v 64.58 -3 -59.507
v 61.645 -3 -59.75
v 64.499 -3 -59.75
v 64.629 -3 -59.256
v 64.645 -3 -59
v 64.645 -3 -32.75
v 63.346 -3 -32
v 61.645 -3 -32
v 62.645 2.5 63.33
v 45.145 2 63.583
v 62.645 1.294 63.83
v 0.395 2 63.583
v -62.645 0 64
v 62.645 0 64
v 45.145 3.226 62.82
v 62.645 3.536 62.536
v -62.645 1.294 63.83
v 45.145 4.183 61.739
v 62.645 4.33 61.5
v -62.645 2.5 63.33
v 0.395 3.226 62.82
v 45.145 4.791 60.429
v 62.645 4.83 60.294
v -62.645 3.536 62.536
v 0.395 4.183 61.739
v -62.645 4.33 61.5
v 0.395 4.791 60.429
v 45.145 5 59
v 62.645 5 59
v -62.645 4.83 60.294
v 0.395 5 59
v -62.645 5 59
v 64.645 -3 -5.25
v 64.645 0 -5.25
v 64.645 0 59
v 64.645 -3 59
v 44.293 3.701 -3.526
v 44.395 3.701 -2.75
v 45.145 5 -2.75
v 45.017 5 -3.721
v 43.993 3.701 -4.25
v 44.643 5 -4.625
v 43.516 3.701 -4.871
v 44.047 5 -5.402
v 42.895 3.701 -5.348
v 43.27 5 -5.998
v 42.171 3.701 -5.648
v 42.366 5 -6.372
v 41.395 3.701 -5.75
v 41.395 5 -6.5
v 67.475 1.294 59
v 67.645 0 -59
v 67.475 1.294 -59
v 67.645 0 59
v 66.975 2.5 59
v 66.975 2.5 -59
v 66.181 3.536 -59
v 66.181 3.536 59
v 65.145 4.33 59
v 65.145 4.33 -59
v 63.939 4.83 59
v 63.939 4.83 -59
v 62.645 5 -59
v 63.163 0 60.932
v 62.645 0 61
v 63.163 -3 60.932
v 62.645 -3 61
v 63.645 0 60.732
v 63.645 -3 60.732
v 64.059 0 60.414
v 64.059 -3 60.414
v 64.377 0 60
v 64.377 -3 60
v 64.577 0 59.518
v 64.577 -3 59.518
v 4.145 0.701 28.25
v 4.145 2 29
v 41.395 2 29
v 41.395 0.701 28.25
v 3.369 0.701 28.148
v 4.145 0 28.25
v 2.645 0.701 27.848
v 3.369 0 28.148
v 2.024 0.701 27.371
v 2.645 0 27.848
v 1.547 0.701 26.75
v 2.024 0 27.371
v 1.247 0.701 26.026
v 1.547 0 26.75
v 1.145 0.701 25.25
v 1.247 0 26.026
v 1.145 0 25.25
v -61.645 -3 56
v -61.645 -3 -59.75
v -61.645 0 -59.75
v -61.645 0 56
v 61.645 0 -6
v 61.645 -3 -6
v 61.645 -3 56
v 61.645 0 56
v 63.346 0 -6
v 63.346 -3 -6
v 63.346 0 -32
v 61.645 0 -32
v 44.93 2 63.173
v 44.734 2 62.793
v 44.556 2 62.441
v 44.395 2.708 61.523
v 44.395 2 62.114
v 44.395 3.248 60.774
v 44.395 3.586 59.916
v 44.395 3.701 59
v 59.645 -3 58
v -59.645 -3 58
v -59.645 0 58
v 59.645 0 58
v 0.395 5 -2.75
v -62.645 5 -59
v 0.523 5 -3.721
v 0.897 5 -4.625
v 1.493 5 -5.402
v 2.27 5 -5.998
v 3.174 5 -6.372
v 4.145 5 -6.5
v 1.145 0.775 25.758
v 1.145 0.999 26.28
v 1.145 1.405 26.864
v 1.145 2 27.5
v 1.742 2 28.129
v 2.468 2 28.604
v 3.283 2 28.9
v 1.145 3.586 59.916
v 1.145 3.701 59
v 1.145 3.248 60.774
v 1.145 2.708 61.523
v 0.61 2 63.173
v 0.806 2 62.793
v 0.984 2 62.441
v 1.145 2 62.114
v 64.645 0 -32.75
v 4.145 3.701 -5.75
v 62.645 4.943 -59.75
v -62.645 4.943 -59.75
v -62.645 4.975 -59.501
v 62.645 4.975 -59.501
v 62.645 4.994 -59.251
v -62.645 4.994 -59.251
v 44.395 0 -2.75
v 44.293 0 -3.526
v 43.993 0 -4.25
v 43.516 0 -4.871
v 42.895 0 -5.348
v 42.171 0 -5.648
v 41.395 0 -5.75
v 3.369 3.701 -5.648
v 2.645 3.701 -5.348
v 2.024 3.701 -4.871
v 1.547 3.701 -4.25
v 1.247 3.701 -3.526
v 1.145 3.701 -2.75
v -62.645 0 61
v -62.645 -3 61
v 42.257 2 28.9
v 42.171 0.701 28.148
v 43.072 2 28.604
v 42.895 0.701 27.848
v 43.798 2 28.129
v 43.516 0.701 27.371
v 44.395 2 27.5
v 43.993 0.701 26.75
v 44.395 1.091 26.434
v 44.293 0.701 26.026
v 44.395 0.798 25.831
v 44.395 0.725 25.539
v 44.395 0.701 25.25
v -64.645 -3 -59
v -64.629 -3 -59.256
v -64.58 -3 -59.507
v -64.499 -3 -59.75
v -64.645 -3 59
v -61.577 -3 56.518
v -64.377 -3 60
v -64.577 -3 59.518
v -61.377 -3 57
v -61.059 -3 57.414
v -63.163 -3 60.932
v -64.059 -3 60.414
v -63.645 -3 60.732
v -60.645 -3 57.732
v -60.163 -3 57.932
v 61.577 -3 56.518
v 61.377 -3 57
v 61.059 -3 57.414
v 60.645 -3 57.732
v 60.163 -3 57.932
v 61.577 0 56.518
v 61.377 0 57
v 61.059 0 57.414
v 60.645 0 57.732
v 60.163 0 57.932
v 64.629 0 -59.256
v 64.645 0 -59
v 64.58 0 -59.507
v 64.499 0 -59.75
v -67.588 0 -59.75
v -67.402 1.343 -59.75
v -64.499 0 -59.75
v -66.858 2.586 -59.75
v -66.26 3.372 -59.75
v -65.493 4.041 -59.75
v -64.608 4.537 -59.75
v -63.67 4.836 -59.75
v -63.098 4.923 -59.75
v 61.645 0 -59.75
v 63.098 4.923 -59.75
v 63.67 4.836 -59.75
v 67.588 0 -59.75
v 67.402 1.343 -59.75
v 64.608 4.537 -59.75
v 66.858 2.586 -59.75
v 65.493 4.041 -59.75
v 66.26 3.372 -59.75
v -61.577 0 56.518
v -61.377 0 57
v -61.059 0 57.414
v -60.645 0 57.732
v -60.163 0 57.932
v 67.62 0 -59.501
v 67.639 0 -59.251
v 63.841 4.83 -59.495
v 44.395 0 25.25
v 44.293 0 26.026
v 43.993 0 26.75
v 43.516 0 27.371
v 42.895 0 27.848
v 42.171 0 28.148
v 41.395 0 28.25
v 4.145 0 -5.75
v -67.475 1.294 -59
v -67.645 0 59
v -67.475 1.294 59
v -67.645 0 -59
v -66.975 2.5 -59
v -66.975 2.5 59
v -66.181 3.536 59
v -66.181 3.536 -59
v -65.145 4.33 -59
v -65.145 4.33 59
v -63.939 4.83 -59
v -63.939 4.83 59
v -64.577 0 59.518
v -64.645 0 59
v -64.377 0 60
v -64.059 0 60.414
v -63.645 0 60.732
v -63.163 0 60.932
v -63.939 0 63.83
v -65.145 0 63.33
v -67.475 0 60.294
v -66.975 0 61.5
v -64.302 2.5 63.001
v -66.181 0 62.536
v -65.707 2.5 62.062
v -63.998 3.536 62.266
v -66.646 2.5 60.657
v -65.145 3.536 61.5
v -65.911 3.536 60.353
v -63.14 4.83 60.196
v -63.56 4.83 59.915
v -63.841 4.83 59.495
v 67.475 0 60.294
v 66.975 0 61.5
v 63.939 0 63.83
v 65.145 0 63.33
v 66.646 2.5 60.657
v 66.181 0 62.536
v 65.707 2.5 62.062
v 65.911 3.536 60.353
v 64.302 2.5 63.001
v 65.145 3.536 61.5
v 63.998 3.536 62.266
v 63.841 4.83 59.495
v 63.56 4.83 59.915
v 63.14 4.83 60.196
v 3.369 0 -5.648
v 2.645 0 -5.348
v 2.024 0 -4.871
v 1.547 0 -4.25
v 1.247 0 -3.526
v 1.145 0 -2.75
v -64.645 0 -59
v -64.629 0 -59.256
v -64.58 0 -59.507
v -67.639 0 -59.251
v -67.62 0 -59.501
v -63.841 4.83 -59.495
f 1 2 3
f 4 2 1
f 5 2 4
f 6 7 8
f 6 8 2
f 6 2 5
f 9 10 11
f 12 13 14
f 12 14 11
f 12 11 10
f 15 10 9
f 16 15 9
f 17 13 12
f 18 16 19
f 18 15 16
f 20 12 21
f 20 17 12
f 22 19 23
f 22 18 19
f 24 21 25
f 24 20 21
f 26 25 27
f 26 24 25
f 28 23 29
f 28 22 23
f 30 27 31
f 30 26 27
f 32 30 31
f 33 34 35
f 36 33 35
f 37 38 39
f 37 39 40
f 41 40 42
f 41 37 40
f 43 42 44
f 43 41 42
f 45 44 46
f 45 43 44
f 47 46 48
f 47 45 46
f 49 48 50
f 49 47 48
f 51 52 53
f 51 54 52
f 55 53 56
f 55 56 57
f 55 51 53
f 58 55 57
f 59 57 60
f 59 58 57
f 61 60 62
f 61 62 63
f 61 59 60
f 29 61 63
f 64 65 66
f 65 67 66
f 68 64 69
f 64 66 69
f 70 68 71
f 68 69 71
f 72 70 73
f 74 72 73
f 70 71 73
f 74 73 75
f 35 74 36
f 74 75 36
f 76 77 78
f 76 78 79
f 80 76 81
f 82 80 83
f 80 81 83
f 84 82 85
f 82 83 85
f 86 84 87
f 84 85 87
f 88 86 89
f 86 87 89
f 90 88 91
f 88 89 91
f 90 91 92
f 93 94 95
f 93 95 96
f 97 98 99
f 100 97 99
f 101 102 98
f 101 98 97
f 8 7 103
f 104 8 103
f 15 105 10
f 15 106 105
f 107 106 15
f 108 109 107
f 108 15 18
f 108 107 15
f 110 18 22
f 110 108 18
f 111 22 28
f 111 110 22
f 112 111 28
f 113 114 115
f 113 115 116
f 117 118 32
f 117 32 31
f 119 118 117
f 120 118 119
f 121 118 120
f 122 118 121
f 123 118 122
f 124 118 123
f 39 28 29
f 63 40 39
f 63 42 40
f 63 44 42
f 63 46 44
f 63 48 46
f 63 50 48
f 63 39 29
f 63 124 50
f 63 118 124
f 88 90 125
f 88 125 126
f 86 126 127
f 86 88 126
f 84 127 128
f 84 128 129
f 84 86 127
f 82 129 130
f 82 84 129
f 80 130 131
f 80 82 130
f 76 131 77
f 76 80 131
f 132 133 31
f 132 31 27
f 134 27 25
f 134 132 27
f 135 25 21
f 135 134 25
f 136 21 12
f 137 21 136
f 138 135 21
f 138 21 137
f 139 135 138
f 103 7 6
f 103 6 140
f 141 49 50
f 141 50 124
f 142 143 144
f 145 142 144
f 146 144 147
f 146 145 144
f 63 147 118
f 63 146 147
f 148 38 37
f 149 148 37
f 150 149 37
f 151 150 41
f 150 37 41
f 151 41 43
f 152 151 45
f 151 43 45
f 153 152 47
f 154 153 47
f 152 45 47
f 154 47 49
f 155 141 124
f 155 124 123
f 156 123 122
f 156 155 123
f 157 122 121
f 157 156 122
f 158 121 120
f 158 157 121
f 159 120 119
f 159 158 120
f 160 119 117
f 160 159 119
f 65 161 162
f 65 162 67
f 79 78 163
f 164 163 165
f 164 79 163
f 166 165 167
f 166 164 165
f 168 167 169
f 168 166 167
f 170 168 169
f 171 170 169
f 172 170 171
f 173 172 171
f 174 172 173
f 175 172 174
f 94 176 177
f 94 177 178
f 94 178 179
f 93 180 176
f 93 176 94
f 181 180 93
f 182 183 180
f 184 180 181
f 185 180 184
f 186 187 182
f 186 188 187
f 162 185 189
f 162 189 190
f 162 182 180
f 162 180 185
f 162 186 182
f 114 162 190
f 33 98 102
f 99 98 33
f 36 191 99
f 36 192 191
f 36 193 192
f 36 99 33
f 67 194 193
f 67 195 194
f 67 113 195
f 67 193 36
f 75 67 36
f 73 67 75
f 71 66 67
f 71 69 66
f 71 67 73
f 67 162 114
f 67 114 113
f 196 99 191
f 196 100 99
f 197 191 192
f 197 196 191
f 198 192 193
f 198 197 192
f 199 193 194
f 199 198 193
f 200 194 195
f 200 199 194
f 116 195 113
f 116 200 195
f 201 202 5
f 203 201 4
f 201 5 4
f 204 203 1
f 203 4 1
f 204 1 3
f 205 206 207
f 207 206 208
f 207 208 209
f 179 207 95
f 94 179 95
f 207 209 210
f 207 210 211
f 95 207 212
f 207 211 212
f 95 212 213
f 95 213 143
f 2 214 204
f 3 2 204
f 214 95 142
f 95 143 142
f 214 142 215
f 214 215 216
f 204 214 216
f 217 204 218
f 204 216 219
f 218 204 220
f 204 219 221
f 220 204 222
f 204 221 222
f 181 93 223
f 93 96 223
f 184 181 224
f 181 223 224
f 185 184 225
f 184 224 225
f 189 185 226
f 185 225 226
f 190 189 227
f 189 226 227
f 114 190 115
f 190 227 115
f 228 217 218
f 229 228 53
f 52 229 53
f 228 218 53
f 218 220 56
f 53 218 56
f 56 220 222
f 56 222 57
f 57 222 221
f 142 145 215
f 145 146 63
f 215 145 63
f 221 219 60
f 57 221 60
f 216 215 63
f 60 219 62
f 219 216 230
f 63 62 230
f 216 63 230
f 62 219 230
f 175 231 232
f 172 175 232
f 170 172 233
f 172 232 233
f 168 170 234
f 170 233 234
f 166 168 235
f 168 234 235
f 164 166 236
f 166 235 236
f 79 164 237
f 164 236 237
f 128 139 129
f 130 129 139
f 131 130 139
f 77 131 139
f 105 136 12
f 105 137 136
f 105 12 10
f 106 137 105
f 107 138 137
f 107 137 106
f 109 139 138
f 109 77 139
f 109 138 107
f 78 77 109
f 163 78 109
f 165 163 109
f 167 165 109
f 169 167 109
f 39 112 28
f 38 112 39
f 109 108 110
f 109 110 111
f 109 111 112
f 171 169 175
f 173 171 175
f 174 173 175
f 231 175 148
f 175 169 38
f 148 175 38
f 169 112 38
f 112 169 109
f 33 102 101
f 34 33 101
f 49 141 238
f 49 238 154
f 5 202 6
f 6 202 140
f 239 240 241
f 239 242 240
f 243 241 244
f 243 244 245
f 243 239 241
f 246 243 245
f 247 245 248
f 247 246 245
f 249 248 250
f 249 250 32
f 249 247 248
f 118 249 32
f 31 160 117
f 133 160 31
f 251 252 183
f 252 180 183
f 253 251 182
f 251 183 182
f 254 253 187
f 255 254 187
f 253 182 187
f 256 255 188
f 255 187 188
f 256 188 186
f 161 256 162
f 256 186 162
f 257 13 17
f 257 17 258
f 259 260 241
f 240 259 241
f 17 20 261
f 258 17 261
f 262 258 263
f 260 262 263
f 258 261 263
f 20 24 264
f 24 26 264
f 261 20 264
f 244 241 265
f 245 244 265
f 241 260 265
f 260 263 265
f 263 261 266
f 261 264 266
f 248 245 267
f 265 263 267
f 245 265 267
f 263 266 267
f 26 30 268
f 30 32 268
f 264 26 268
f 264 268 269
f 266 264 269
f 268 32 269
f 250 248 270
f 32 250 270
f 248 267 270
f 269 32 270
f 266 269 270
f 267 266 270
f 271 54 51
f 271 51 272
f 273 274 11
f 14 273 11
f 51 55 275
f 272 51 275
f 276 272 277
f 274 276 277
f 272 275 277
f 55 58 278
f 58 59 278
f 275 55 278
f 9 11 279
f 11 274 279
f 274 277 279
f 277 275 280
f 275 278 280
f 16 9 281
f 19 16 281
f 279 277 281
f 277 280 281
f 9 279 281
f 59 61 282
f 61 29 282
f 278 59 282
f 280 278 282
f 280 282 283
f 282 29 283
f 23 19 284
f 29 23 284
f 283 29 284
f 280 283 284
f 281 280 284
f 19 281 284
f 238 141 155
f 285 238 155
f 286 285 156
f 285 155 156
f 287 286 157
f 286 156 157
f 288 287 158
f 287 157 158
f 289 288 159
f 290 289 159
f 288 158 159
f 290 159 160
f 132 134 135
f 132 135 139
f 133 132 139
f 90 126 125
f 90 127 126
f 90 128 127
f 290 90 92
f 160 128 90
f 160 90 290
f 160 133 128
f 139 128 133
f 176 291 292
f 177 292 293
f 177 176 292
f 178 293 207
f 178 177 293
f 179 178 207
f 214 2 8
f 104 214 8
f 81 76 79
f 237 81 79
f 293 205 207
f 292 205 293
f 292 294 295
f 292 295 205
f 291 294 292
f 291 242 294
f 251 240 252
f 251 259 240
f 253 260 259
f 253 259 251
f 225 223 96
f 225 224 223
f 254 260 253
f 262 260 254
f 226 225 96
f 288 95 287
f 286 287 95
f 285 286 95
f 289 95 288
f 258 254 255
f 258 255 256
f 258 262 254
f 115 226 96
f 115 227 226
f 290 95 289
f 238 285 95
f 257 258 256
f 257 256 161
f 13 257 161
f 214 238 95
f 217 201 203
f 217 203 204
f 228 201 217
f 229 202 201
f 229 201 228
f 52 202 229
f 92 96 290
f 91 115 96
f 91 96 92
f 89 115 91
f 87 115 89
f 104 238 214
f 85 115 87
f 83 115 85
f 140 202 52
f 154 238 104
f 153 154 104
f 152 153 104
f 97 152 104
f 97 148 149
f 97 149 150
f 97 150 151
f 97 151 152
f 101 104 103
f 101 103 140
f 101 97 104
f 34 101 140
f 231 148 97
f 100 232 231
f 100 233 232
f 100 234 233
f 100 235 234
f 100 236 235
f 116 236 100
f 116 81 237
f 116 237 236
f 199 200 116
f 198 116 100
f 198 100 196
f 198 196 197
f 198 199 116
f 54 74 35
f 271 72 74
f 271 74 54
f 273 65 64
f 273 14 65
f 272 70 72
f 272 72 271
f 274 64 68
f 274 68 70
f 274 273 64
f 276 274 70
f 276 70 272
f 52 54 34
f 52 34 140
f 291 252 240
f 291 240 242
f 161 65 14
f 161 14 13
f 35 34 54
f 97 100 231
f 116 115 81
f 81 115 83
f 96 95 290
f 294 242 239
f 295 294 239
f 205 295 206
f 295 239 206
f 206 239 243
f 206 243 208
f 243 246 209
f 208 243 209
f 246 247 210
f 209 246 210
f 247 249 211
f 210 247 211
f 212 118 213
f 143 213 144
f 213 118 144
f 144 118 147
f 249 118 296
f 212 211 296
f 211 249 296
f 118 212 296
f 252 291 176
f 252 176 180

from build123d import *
from OCP.BRepFilletAPI import BRepFilletAPI_MakeChamfer

# Parameters (mm, degrees)
SKETCH1_W           = 135.29
SKETCH1_H           = 128
BOSS_EXTRUDE1_DEPTH = 5
SKETCH2_W           = 129.29
SKETCH2_H           = 122
BOSS_EXTRUDE2_DEPTH = 3
FILLET4_R           = 5
FILLET5_R           = 5
FILLET6_R           = 2
CUT_EXTRUDE1_REACH  = 95.466
SKETCH3_W           = 135.29
SKETCH3_H           = 4.25
SKETCH4_W           = 123.29
SKETCH4_H           = 117.75
CUT_EXTRUDE2_DEPTH  = 3
FILLET7_R           = 2
SKETCH5_W           = 43.25
SKETCH5_H           = 69.75
CUT_EXTRUDE3_DEPTH  = 3
SKETCH6_W           = 43.25
SKETCH6_H           = 34
CUT_EXTRUDE4_DEPTH  = 2
FILLET9_R           = 3
CHAMFER1_SIZE       = 0.75
CHAMFER1_SIZE2      = 1.299038106
CHAMFER2_SIZE       = 0.75
CHAMFER2_SIZE_2     = 1.299038106
SKETCH7_W           = 26
SKETCH7_H           = 3
CUT_EXTRUDE5_DEPTH  = 3
CHAMFER3_SIZE       = 0.75
CHAMFER3_SIZE2      = 1.299038106


# Some blends are built 0.0001 mm under size
with BuildPart() as part:
    # Sketch1 → Boss-Extrude1 (new body)
    with BuildSketch(Plane(origin=(0, 0, 0), x_dir=(1, 0, 0), z_dir=(0, 1, 0))):
        Rectangle(SKETCH1_W, SKETCH1_H)
    extrude(amount=BOSS_EXTRUDE1_DEPTH)

    # Sketch2 → Boss-Extrude2 (add)
    with BuildSketch(Plane.XZ):
        Rectangle(SKETCH2_W, SKETCH2_H)
    extrude(amount=BOSS_EXTRUDE2_DEPTH)

    # Fillet4
    fillet4_edges = [part.edges().sort_by_distance(p)[0] for p in [
        (-67.645, 2.5, -64),
        (67.645, 2.5, -64),
        (67.645, 2.5, 64),
        (-67.645, 2.5, 64),
    ]]
    fillet(fillet4_edges, radius=FILLET4_R)

    # Fillet5
    fillet5_edges = [part.edges().sort_by_distance(p)[0] for p in [
        (-66.180533906, 5, -62.535533906),
        (-67.645, 5, 0),
        (-66.180533906, 5, 62.535533906),
        (0, 5, 64),
        (66.180533906, 5, 62.535533906),
        (67.645, 5, 0),
        (66.180533906, 5, -62.535533906),
        (0, 5, -64),
    ]]
    fillet(fillet5_edges, radius=FILLET5_R - 0.0001)  # a hair under: the kernel refuses the full size

    # Fillet6
    fillet6_edges = [part.edges().sort_by_distance(p)[0] for p in [
        (-64.645, -1.5, 61),
        (-64.645, -1.5, -61),
        (64.645, -1.5, -61),
        (64.645, -1.5, 61),
    ]]
    fillet(fillet6_edges, radius=FILLET6_R)

    # Cut-Extrude1: up to this face of the body (flat: up to its plane)
    cut_extrude1_end = Plane(part.part.faces().sort_by_distance((0, -3, 0))[0])
    # Sketch3 → Cut-Extrude1 (cut, up to the picked face)
    with BuildSketch(Plane(origin=(0, 5, 0), x_dir=(1, 0, 0), z_dir=(0, 1, 0)), mode=Mode.PRIVATE) as cut_extrude1_sk1:
        with Locations((0, 61.875)):
            Rectangle(SKETCH3_W, SKETCH3_H)
    cut_extrude1_tool1 = split(extrude(cut_extrude1_sk1.sketch, amount=-CUT_EXTRUDE1_REACH, mode=Mode.PRIVATE), bisect_by=cut_extrude1_end, keep=Keep.BOTH, mode=Mode.PRIVATE)
    add(cut_extrude1_tool1.solids().sort_by(Axis((0, 5, -61.875), (0, -1, 0)))[0], mode=Mode.SUBTRACT)

    # Sketch4 → Cut-Extrude2 (cut)
    with BuildSketch(Plane.XZ.offset(3)):
        with Locations((0, -0.875)):
            Rectangle(SKETCH4_W, SKETCH4_H)
    extrude(amount=-CUT_EXTRUDE2_DEPTH, mode=Mode.SUBTRACT)

    # Fillet7
    fillet7_edges = [part.edges().sort_by_distance(p)[0] for p in [
        (-61.645, -1.5, 58),
        (61.645, -1.5, 58),
    ]]
    fillet(fillet7_edges, radius=FILLET7_R)

    # Sketch5 → Cut-Extrude3 (cut)
    with BuildSketch(Plane(origin=(0, 5, 0), x_dir=(1, 0, 0), z_dir=(0, 1, 0))):
        with Locations((22.77, -29.125)):
            Rectangle(SKETCH5_W, SKETCH5_H)
    extrude(amount=-CUT_EXTRUDE3_DEPTH, mode=Mode.SUBTRACT)

    # Sketch6 → Cut-Extrude4 (cut)
    with BuildSketch(Plane(origin=(0, 2, 0), x_dir=(1, 0, 0), z_dir=(0, 1, 0))):
        with Locations((22.77, -11.25)):
            Rectangle(SKETCH6_W, SKETCH6_H)
    extrude(amount=-CUT_EXTRUDE4_DEPTH, mode=Mode.SUBTRACT)

    # Fillet9
    fillet9_edges = [part.edges().sort_by_distance(p)[0] for p in [
        (1.145, 2.5, -5.75),
        (44.395, 2.5, -5.75),
        (44.395, 1, 28.25),
        (1.145, 1, 28.25),
    ]]
    fillet(fillet9_edges, radius=FILLET9_R)

    # Chamfer1: one chamfer whose edges measure the first distance from different faces: ONE call of the kernel's chamfer builder (chamfer() names one face for all edges)
    chamfer1_edges_1 = [part.edges().sort_by_distance(p)[0] for p in [
        (44.395, 4.183298538, 61.738685401),
        (1.145, 4.183298538, 61.738685401),
    ]]
    chamfer1_side_1 = [part.faces().sort_by_distance(p)[0] for p in [
        (0, 3.535563195, 62.535563195),
    ]]
    chamfer1_edges_2 = [part.edges().sort_by_distance(p)[0] for p in [
        (44.395, 5, 28.12505),
        (1.145, 5, 28.12505),
        (22.77, 5, -5.75),
        (43.516320344, 5, -4.871320344),
        (2.023679656, 5, -4.871320344),
    ]]
    chamfer1_side_2 = [part.faces().sort_by_distance(p)[0] for p in [
        (-5.311957969, 5, -6.221509605),
    ]]
    chamfer1 = BRepFilletAPI_MakeChamfer(part.part.solid().wrapped)
    for e in chamfer1_edges_1:
        chamfer1.Add(CHAMFER1_SIZE, CHAMFER1_SIZE2, e.wrapped, chamfer1_side_1[0].wrapped)  # the first distance lies on this face
    for e in chamfer1_edges_2:
        chamfer1.Add(CHAMFER1_SIZE, CHAMFER1_SIZE2, e.wrapped, chamfer1_side_2[0].wrapped)  # the first distance lies on this face
    add(Compound.cast(chamfer1.Shape()), mode=Mode.REPLACE)

    # Chamfer2
    # the kernel refuses this chamfer: 1.299038106, 0.75 mm, written as the material it takes off along each edge
    with BuildSketch(Plane(origin=(41.395, 2, 28.25), x_dir=(0, 0.05789386240267144, 0.9983227437537926), z_dir=(-1, 0, 0))) as chamfer2_piece_1:
        Polygon((CHAMFER2_SIZE * 0.998322743754, -CHAMFER2_SIZE * 0.0578938624027), (-CHAMFER2_SIZE_2 * 0.0578938623883, -CHAMFER2_SIZE_2 * 0.998322743505), (0, 0), align=None)
    extrude(amount=37.25, mode=Mode.SUBTRACT)
    with BuildSketch(Plane(origin=(4.145, 2, 25.25), x_dir=(-0.43506037057501545, 0, -0.9004012849586179), z_dir=(0.9004012849586179, 0, -0.43506037057501545))) as chamfer2_piece_2_section:
        Polygon((3 + CHAMFER2_SIZE, 0), (3, -CHAMFER2_SIZE_2), (3, 0), align=None)
    chamfer2_piece_2 = revolve(axis=Axis((4.145, 2, 25.25), (0, 1, 0)), revolution_arc=154.210864587, mode=Mode.PRIVATE)
    chamfer2_piece_2 = split(chamfer2_piece_2, bisect_by=Plane(origin=(1.145, 1.523753347, 27.427166172), z_dir=(1, 0, 0)), keep=Keep.TOP, mode=Mode.PRIVATE)
    add(chamfer2_piece_2, mode=Mode.SUBTRACT)
    with BuildSketch(Plane(origin=(41.395, 2, 25.25), x_dir=(0, 0, 1), z_dir=(-1, 0, 0))) as chamfer2_piece_3_section:
        Polygon((3 + CHAMFER2_SIZE, 0), (3, -CHAMFER2_SIZE_2), (3, 0), align=None)
    chamfer2_piece_3 = revolve(axis=Axis((41.395, 2, 25.25), (0, 1, 0)), revolution_arc=154.210864587, mode=Mode.PRIVATE)
    chamfer2_piece_3 = split(chamfer2_piece_3, bisect_by=Plane(origin=(44.395, 1.633451558, 28.466921633), z_dir=(-1, 0, 0)), keep=Keep.TOP, mode=Mode.PRIVATE)
    add(chamfer2_piece_3, mode=Mode.SUBTRACT)

    # Sketch7 → Cut-Extrude5 (cut)
    with BuildSketch(Plane(origin=(64.645, 0, 0), x_dir=(0, 0, -1), z_dir=(1, 0, 0))):
        with Locations((19, -1.5)):
            Rectangle(SKETCH7_W, SKETCH7_H)
    extrude(amount=-CUT_EXTRUDE5_DEPTH, mode=Mode.SUBTRACT)

    # Chamfer3: one chamfer whose edges measure the first distance from different faces: ONE call of the kernel's chamfer builder (chamfer() names one face for all edges)
    chamfer3_edges_1 = [part.edges().sort_by_distance(p)[0] for p in [
        (64.645, -1.5, -6),
    ]]
    chamfer3_side_1 = [part.faces().sort_by_distance(p)[0] for p in [
        (64.645, -1.5, 26.5),
    ]]
    chamfer3_edges_2 = [part.edges().sort_by_distance(p)[0] for p in [
        (64.645, -1.5, -32),
    ]]
    chamfer3_side_2 = [part.faces().sort_by_distance(p)[0] for p in [
        (64.645, -1.5, -45.5),
    ]]
    chamfer3 = BRepFilletAPI_MakeChamfer(part.part.solid().wrapped)
    for e in chamfer3_edges_1:
        chamfer3.Add(CHAMFER3_SIZE, CHAMFER3_SIZE2, e.wrapped, chamfer3_side_1[0].wrapped)  # the first distance lies on this face
    for e in chamfer3_edges_2:
        chamfer3.Add(CHAMFER3_SIZE, CHAMFER3_SIZE2, e.wrapped, chamfer3_side_2[0].wrapped)  # the first distance lies on this face
    add(Compound.cast(chamfer3.Shape()), mode=Mode.REPLACE)


solid = part.part
